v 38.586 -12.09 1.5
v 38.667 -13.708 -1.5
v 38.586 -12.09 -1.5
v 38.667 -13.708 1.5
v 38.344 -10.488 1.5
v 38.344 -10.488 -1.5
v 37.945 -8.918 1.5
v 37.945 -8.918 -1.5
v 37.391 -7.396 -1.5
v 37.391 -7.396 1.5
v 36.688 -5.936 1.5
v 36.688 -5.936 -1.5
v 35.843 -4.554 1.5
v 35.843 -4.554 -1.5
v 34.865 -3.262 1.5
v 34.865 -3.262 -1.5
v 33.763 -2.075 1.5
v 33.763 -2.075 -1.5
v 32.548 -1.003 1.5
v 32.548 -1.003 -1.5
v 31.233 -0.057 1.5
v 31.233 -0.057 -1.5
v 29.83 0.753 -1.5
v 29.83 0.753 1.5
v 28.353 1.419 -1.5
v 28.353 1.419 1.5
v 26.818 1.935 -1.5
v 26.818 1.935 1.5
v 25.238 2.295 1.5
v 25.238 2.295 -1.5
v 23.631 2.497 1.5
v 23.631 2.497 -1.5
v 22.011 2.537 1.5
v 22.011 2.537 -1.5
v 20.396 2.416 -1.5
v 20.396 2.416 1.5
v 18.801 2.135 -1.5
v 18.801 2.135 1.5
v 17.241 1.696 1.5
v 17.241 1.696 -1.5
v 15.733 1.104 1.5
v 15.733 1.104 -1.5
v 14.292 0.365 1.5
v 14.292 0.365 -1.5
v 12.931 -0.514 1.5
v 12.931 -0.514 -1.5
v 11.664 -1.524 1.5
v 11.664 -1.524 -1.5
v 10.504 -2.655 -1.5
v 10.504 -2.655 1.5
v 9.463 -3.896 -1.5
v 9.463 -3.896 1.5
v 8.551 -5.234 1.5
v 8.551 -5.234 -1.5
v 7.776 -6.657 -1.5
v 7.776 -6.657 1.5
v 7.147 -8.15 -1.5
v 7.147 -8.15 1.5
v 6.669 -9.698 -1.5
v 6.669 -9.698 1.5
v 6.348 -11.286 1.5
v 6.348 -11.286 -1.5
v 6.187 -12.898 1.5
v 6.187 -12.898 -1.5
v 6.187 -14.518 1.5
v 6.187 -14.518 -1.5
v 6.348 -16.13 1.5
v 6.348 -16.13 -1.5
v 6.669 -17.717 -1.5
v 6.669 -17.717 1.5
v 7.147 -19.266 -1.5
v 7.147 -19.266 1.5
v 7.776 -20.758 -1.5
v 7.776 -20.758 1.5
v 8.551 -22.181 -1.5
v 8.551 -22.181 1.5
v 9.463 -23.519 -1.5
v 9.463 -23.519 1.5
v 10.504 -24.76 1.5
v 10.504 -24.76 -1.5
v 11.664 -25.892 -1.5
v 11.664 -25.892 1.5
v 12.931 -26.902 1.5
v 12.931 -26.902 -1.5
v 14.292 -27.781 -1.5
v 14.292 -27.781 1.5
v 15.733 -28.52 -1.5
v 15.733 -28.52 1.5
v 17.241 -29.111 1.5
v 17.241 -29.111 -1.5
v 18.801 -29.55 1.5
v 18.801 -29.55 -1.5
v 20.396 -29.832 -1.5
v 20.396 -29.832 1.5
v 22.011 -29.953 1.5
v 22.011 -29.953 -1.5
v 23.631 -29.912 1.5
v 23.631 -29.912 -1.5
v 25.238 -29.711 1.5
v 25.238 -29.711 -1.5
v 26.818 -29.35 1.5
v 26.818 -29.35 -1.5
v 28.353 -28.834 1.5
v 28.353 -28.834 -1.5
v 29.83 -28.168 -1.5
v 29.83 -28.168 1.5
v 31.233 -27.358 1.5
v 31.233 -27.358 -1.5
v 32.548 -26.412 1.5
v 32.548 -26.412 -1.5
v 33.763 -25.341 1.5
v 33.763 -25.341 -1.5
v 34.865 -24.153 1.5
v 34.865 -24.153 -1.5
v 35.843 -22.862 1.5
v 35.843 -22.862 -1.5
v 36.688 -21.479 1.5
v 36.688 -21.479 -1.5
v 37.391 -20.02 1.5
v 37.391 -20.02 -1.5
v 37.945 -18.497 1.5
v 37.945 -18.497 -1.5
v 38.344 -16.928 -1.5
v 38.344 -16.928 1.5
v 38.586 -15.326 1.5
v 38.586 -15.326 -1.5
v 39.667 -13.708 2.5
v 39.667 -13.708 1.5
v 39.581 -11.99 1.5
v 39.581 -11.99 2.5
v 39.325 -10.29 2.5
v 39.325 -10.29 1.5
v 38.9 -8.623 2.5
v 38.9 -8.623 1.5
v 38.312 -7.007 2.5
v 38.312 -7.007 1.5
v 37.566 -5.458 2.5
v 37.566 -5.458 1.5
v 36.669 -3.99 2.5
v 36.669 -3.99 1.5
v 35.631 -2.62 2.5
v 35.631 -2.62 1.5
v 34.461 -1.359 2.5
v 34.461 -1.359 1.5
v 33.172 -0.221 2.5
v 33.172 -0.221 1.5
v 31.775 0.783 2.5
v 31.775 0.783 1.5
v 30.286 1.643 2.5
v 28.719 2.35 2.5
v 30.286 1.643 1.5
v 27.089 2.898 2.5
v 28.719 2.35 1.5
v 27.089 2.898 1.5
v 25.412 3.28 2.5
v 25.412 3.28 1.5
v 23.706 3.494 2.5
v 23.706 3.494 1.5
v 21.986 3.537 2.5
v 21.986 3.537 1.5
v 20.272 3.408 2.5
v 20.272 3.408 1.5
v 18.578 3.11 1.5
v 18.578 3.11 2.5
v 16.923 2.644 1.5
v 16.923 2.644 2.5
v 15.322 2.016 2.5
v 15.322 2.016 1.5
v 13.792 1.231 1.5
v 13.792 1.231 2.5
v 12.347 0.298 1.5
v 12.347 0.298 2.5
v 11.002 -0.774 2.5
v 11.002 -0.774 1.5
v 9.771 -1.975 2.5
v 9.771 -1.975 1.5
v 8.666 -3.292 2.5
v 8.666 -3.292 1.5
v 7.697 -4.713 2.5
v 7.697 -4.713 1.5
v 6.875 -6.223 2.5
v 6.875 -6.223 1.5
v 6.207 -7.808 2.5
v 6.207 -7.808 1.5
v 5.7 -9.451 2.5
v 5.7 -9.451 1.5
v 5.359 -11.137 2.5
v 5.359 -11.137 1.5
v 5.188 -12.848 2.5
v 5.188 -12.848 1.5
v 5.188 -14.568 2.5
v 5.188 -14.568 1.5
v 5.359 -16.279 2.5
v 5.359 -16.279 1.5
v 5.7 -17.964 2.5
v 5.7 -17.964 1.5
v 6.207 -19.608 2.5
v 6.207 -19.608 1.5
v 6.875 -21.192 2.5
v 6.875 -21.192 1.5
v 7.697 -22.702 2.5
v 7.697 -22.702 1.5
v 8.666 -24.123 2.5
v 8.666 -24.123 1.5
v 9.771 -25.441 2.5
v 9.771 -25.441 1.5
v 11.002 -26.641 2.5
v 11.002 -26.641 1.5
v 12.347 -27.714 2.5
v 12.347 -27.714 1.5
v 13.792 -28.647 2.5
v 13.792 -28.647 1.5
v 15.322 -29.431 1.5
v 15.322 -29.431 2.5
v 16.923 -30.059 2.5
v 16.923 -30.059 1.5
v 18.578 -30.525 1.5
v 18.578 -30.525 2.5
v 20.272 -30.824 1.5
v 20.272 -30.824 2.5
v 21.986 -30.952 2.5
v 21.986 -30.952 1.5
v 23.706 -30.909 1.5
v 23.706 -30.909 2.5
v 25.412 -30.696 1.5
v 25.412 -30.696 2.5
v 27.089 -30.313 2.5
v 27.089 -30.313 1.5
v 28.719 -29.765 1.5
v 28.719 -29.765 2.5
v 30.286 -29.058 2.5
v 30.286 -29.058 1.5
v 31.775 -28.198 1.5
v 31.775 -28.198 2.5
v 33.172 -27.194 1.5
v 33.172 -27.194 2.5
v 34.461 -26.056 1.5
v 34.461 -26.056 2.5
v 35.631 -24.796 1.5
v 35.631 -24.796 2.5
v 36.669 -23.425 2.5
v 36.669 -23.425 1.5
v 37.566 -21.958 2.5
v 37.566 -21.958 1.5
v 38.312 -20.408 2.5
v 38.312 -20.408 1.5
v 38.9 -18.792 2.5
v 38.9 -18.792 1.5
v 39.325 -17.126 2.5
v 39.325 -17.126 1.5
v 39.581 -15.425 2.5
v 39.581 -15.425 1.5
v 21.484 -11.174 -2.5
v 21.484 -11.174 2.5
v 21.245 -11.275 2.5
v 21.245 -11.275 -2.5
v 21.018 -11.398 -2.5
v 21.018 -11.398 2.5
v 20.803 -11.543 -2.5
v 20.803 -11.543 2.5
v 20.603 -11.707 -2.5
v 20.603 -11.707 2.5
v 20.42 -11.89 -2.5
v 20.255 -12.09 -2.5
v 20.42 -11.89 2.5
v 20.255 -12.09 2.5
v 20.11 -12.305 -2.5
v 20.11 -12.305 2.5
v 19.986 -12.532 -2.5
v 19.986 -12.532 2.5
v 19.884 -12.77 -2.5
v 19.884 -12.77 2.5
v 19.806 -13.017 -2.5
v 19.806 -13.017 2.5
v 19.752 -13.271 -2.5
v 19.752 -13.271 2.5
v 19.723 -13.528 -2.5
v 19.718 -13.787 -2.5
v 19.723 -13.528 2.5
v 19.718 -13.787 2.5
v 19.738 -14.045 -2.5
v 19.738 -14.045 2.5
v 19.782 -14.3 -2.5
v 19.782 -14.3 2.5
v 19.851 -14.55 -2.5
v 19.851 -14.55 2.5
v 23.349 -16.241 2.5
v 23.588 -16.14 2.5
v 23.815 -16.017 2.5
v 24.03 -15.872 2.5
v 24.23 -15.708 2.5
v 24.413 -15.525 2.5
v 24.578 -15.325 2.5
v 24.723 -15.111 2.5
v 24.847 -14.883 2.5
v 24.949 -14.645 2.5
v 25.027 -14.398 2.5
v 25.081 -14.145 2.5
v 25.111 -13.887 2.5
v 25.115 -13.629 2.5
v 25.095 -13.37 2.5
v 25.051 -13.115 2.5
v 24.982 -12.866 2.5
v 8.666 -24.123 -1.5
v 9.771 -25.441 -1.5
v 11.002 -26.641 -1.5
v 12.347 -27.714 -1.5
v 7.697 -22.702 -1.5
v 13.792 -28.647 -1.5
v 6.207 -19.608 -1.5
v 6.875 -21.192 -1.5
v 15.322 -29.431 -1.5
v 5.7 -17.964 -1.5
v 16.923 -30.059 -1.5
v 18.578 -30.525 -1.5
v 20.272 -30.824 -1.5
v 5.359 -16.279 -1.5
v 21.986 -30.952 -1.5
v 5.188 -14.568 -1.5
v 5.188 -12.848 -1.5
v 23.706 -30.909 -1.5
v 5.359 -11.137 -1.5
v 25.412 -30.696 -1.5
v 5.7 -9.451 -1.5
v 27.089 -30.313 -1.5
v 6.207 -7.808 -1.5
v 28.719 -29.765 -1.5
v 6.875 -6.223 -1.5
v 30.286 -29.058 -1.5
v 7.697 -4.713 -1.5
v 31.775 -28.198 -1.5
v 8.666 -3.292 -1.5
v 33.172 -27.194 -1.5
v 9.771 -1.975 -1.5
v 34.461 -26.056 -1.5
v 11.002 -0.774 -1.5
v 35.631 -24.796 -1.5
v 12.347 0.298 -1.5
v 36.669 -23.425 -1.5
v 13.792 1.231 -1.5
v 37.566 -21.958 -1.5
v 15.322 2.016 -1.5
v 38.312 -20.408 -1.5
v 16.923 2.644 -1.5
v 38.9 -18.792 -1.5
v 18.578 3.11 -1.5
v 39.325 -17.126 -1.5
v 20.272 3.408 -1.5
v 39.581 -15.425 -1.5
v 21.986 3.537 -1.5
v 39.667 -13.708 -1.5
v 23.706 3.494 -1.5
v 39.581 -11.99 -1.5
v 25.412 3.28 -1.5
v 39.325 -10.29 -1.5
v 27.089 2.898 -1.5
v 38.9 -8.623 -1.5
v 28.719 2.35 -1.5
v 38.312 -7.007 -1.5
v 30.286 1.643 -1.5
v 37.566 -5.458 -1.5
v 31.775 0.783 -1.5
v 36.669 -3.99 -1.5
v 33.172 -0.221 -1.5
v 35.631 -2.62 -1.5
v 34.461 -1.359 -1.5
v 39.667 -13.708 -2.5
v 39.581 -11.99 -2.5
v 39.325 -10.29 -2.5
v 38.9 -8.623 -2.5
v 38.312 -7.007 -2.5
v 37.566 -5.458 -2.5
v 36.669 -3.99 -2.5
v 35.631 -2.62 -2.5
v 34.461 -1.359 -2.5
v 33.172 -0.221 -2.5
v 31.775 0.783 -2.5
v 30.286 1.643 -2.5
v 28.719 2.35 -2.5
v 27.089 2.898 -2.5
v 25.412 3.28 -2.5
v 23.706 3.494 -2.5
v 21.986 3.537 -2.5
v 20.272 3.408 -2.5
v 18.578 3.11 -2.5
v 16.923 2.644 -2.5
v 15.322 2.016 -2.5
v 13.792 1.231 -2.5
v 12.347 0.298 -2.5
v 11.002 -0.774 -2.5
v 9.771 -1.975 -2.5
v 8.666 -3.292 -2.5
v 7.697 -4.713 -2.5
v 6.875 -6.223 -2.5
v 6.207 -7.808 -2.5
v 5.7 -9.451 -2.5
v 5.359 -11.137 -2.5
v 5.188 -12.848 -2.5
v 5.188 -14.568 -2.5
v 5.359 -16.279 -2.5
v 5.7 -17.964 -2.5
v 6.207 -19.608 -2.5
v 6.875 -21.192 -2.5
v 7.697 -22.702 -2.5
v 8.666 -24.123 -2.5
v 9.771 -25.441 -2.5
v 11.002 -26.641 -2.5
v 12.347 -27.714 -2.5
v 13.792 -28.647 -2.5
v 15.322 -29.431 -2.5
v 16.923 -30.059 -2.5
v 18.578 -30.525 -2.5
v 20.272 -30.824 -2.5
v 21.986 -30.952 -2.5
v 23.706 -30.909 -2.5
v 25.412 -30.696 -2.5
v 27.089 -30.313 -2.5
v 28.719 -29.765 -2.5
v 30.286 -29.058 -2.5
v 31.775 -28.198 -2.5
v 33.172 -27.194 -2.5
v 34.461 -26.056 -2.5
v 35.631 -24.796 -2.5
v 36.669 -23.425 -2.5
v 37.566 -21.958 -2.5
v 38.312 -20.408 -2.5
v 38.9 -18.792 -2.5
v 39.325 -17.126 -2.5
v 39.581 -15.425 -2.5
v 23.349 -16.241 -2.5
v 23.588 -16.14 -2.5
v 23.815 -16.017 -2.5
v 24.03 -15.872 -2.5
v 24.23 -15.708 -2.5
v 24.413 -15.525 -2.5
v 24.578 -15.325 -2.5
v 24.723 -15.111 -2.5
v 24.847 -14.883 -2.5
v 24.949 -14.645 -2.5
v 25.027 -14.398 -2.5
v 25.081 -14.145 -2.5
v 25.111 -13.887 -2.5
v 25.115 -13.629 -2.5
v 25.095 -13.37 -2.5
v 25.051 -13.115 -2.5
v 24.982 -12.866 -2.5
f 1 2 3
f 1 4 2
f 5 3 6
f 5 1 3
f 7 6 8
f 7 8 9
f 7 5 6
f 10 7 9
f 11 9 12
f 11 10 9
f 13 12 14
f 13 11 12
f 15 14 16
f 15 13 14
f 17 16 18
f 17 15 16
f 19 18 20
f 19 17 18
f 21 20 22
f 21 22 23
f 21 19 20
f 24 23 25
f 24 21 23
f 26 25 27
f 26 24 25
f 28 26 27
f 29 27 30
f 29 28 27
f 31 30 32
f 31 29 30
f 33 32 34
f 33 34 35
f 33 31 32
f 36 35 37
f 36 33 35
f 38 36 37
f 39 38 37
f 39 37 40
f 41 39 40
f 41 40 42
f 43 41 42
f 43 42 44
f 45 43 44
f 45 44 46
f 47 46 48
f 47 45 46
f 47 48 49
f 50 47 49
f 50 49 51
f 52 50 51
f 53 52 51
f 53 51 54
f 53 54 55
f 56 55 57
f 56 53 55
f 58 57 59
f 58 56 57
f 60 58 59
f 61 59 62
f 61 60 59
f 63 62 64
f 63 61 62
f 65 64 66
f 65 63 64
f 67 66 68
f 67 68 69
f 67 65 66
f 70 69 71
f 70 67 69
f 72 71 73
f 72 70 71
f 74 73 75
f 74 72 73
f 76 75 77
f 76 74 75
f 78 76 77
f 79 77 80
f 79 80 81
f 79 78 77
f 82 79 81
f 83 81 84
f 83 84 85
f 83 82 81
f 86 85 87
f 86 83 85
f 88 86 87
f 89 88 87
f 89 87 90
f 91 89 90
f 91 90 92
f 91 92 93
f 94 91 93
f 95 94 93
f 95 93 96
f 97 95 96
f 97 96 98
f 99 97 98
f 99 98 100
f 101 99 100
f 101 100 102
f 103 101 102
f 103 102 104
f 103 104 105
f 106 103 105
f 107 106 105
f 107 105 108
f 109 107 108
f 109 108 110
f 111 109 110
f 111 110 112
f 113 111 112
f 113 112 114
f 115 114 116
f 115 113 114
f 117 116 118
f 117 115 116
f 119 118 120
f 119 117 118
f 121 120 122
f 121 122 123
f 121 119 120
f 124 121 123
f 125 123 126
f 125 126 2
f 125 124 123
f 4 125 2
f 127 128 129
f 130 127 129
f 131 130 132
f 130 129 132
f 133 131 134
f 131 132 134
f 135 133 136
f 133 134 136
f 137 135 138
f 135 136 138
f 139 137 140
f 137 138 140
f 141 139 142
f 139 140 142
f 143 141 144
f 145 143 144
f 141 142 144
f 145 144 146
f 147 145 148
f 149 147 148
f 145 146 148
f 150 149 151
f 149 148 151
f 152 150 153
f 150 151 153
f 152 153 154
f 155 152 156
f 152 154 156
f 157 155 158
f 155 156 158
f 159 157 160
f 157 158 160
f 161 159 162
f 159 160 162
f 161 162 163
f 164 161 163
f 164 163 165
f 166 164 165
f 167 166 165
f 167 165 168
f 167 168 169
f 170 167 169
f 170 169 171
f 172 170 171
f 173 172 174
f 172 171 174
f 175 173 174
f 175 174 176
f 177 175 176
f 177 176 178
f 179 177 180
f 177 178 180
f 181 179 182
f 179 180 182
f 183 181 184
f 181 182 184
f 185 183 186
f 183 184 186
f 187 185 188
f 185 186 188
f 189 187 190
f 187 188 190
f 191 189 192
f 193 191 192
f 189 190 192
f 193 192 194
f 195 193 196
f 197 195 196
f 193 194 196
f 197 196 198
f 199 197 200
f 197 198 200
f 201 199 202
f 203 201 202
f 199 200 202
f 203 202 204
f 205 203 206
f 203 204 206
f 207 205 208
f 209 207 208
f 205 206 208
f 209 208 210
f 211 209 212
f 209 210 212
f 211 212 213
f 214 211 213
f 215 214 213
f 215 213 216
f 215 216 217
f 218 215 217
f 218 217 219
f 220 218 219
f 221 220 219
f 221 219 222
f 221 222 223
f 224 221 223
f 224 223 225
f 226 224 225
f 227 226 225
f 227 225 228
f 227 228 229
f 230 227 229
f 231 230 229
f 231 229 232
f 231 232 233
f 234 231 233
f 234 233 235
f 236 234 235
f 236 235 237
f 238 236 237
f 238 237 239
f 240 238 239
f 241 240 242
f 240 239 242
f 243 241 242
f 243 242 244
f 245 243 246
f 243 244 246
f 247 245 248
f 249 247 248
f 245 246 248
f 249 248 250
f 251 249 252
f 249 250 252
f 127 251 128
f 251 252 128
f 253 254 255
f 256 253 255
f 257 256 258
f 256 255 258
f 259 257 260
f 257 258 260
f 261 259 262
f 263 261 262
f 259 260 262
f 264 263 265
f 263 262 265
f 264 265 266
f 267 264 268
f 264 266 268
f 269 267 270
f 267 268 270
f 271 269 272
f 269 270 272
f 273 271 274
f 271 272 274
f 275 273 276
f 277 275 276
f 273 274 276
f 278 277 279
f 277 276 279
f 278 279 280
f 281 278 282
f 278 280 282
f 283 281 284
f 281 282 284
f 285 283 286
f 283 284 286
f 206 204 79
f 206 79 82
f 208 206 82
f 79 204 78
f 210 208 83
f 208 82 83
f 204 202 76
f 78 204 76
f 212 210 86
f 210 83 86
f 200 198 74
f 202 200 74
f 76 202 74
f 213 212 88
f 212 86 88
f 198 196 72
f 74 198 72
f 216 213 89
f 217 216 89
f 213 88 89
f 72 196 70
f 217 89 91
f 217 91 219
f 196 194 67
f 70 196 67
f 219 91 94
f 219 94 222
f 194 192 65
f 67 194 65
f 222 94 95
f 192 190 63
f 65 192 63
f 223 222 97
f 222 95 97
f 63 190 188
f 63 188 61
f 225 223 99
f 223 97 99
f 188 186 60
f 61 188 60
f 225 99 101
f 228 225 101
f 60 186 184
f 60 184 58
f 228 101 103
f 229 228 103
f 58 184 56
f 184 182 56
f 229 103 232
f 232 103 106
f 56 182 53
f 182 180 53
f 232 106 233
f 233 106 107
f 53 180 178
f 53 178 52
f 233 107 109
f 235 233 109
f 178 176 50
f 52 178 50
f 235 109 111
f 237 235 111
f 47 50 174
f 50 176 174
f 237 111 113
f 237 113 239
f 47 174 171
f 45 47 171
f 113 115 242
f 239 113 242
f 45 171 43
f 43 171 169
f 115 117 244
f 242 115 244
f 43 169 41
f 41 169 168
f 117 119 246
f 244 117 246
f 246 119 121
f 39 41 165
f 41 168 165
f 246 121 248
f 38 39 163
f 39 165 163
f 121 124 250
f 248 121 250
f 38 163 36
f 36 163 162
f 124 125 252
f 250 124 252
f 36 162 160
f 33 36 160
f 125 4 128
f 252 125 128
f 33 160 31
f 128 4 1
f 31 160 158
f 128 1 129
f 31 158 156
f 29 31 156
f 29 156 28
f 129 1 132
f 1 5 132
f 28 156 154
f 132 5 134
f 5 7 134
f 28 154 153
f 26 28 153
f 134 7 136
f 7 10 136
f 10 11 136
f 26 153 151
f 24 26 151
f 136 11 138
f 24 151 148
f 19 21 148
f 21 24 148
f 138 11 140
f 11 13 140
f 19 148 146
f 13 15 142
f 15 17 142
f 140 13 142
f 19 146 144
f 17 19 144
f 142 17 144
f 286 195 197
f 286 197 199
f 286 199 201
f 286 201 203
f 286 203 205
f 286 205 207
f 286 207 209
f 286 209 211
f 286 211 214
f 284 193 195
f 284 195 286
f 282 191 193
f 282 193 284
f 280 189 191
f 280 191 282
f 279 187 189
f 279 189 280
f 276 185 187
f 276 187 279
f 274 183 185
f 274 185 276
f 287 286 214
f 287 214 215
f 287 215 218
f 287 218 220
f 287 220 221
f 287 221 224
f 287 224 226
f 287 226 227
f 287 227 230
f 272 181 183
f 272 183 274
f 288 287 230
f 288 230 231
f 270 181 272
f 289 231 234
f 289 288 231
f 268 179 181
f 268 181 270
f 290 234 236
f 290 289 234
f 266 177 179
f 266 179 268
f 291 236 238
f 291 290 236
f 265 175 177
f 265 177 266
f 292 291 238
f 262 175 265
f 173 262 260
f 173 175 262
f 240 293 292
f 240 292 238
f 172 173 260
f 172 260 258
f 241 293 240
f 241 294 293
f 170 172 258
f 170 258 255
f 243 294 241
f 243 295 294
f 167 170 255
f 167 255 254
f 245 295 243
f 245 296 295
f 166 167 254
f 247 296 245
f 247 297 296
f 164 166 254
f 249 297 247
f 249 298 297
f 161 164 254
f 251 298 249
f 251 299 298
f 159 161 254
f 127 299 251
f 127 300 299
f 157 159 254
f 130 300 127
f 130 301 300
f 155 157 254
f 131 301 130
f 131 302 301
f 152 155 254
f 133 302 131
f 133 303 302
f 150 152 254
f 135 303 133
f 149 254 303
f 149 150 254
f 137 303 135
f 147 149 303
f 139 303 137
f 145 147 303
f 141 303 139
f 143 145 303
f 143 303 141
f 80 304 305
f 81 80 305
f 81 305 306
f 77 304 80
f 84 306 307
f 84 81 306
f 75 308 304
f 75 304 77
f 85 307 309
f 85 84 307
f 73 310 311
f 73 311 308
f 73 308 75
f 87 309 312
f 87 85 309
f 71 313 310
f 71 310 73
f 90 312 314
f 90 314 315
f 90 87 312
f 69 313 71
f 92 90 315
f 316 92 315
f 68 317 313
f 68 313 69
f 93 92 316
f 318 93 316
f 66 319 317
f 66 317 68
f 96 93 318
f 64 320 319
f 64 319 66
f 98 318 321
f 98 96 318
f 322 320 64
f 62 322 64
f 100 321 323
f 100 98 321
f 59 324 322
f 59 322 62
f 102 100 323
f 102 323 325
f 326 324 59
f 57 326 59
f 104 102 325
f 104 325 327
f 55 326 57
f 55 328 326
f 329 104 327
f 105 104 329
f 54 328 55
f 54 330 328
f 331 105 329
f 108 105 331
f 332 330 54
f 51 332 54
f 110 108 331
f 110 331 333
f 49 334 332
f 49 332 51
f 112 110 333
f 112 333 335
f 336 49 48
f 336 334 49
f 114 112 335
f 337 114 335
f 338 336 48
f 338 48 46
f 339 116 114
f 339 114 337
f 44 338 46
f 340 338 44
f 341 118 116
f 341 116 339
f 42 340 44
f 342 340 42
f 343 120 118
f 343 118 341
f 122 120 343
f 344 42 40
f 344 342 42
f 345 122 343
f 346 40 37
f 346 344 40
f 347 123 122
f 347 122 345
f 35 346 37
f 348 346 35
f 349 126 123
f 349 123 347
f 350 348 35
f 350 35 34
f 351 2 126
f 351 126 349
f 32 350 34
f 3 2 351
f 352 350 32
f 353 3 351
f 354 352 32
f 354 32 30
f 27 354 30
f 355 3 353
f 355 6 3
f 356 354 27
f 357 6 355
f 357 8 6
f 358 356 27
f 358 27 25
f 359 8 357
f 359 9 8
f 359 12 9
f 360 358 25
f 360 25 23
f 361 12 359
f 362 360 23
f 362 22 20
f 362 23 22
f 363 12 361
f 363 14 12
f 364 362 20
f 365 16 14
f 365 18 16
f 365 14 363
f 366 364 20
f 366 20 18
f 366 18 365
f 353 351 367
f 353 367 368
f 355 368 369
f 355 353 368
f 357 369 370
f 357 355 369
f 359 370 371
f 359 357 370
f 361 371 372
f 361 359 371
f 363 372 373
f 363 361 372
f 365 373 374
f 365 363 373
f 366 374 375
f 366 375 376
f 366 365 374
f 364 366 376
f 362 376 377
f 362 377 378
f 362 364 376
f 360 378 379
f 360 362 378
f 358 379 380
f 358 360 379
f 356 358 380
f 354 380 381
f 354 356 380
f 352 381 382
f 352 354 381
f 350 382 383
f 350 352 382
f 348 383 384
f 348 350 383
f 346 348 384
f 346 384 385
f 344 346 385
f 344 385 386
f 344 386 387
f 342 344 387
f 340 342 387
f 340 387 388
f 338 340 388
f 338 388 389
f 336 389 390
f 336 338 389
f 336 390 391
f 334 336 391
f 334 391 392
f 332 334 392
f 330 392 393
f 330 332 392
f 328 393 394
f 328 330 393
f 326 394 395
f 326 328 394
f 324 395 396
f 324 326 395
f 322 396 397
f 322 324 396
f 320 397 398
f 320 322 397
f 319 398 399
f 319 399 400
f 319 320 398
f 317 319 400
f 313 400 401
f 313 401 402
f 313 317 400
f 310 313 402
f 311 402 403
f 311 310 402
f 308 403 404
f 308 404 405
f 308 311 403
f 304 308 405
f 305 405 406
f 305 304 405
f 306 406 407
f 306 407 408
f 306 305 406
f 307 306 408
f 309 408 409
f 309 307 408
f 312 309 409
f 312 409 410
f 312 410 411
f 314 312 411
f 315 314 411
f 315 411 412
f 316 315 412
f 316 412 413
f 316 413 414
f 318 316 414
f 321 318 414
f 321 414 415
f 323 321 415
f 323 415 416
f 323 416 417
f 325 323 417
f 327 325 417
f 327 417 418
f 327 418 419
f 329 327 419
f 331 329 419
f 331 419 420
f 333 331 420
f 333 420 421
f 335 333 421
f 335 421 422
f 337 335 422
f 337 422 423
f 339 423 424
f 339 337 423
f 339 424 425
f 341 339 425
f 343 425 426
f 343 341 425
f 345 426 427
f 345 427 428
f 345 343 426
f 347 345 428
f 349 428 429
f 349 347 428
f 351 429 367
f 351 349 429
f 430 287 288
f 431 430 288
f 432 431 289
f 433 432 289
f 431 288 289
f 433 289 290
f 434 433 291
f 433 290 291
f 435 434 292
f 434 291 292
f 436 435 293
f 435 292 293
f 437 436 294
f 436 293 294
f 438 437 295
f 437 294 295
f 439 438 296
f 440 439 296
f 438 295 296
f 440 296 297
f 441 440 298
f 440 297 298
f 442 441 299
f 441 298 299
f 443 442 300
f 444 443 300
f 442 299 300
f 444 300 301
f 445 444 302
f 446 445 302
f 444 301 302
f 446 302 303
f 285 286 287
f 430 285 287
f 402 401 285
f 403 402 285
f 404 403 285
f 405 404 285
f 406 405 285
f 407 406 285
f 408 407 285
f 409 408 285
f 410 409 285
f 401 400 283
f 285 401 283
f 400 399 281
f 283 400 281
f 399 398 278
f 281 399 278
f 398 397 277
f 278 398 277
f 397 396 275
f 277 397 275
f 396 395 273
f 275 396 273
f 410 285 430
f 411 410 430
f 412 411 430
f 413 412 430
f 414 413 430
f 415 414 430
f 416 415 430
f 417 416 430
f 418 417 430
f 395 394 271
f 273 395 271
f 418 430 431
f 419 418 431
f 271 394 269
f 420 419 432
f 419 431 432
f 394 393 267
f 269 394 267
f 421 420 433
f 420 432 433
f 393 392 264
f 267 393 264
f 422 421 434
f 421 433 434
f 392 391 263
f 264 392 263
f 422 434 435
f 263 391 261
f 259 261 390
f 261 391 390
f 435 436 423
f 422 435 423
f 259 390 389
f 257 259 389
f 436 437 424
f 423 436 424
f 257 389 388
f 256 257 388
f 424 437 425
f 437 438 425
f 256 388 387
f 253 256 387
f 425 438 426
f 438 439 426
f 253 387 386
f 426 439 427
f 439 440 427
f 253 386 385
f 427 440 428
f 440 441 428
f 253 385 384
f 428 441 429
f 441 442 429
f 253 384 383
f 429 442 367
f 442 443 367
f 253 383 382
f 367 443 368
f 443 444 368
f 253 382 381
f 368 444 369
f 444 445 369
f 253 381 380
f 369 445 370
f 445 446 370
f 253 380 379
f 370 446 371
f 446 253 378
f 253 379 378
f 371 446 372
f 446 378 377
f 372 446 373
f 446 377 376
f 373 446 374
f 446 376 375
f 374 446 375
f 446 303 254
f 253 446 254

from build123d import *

# Parameters (mm, degrees)
SKETCH_1_R          = 16.25
EXTRUDE_1_DEPTH     = 1.5
SKETCH_2_R          = 17.25
EXTRUDE_2_DEPTH     = 1
CUT_EXTRUDE_1_DEPTH = 51.564922409


with BuildPart() as part:
    # 草图1 → 凸台-拉伸1 (new, symmetric)
    with BuildSketch(Plane.XY):
        with Locations((22.416532439, -13.707674049)):
            Circle(SKETCH_1_R)
    extrude(amount=EXTRUDE_1_DEPTH, both=True)

    # 草图2 → 凸台-拉伸2 (add)
    with BuildSketch(Plane.XY.offset(1.5)):
        with Locations((22.416532439, -13.707674049)):
            Circle(SKETCH_2_R)
    extrude_2 = extrude(amount=EXTRUDE_2_DEPTH)

    # 镜向1: 凸台-拉伸2 across plane
    add(extrude_2.mirror(Plane.XY))

    # 草图3 → 切除-拉伸1 (cut, through all)
    with BuildSketch(Plane.XY.offset(2.5)):
        with BuildLine():
            Line((24.98184237, -12.86554285), (21.483879203, -11.17387099))
            ThreePointArc((21.483879203, -11.17387099), (19.985859773, -12.532161228), (19.851222508, -14.549805248))
            Line((19.851222508, -14.549805248), (23.349185675, -16.241477108))
            ThreePointArc((23.349185675, -16.241477108), (24.847205105, -14.88318687), (24.98184237, -12.86554285))
        make_face()
    extrude(amount=-CUT_EXTRUDE_1_DEPTH, mode=Mode.SUBTRACT)


solid = part.part
